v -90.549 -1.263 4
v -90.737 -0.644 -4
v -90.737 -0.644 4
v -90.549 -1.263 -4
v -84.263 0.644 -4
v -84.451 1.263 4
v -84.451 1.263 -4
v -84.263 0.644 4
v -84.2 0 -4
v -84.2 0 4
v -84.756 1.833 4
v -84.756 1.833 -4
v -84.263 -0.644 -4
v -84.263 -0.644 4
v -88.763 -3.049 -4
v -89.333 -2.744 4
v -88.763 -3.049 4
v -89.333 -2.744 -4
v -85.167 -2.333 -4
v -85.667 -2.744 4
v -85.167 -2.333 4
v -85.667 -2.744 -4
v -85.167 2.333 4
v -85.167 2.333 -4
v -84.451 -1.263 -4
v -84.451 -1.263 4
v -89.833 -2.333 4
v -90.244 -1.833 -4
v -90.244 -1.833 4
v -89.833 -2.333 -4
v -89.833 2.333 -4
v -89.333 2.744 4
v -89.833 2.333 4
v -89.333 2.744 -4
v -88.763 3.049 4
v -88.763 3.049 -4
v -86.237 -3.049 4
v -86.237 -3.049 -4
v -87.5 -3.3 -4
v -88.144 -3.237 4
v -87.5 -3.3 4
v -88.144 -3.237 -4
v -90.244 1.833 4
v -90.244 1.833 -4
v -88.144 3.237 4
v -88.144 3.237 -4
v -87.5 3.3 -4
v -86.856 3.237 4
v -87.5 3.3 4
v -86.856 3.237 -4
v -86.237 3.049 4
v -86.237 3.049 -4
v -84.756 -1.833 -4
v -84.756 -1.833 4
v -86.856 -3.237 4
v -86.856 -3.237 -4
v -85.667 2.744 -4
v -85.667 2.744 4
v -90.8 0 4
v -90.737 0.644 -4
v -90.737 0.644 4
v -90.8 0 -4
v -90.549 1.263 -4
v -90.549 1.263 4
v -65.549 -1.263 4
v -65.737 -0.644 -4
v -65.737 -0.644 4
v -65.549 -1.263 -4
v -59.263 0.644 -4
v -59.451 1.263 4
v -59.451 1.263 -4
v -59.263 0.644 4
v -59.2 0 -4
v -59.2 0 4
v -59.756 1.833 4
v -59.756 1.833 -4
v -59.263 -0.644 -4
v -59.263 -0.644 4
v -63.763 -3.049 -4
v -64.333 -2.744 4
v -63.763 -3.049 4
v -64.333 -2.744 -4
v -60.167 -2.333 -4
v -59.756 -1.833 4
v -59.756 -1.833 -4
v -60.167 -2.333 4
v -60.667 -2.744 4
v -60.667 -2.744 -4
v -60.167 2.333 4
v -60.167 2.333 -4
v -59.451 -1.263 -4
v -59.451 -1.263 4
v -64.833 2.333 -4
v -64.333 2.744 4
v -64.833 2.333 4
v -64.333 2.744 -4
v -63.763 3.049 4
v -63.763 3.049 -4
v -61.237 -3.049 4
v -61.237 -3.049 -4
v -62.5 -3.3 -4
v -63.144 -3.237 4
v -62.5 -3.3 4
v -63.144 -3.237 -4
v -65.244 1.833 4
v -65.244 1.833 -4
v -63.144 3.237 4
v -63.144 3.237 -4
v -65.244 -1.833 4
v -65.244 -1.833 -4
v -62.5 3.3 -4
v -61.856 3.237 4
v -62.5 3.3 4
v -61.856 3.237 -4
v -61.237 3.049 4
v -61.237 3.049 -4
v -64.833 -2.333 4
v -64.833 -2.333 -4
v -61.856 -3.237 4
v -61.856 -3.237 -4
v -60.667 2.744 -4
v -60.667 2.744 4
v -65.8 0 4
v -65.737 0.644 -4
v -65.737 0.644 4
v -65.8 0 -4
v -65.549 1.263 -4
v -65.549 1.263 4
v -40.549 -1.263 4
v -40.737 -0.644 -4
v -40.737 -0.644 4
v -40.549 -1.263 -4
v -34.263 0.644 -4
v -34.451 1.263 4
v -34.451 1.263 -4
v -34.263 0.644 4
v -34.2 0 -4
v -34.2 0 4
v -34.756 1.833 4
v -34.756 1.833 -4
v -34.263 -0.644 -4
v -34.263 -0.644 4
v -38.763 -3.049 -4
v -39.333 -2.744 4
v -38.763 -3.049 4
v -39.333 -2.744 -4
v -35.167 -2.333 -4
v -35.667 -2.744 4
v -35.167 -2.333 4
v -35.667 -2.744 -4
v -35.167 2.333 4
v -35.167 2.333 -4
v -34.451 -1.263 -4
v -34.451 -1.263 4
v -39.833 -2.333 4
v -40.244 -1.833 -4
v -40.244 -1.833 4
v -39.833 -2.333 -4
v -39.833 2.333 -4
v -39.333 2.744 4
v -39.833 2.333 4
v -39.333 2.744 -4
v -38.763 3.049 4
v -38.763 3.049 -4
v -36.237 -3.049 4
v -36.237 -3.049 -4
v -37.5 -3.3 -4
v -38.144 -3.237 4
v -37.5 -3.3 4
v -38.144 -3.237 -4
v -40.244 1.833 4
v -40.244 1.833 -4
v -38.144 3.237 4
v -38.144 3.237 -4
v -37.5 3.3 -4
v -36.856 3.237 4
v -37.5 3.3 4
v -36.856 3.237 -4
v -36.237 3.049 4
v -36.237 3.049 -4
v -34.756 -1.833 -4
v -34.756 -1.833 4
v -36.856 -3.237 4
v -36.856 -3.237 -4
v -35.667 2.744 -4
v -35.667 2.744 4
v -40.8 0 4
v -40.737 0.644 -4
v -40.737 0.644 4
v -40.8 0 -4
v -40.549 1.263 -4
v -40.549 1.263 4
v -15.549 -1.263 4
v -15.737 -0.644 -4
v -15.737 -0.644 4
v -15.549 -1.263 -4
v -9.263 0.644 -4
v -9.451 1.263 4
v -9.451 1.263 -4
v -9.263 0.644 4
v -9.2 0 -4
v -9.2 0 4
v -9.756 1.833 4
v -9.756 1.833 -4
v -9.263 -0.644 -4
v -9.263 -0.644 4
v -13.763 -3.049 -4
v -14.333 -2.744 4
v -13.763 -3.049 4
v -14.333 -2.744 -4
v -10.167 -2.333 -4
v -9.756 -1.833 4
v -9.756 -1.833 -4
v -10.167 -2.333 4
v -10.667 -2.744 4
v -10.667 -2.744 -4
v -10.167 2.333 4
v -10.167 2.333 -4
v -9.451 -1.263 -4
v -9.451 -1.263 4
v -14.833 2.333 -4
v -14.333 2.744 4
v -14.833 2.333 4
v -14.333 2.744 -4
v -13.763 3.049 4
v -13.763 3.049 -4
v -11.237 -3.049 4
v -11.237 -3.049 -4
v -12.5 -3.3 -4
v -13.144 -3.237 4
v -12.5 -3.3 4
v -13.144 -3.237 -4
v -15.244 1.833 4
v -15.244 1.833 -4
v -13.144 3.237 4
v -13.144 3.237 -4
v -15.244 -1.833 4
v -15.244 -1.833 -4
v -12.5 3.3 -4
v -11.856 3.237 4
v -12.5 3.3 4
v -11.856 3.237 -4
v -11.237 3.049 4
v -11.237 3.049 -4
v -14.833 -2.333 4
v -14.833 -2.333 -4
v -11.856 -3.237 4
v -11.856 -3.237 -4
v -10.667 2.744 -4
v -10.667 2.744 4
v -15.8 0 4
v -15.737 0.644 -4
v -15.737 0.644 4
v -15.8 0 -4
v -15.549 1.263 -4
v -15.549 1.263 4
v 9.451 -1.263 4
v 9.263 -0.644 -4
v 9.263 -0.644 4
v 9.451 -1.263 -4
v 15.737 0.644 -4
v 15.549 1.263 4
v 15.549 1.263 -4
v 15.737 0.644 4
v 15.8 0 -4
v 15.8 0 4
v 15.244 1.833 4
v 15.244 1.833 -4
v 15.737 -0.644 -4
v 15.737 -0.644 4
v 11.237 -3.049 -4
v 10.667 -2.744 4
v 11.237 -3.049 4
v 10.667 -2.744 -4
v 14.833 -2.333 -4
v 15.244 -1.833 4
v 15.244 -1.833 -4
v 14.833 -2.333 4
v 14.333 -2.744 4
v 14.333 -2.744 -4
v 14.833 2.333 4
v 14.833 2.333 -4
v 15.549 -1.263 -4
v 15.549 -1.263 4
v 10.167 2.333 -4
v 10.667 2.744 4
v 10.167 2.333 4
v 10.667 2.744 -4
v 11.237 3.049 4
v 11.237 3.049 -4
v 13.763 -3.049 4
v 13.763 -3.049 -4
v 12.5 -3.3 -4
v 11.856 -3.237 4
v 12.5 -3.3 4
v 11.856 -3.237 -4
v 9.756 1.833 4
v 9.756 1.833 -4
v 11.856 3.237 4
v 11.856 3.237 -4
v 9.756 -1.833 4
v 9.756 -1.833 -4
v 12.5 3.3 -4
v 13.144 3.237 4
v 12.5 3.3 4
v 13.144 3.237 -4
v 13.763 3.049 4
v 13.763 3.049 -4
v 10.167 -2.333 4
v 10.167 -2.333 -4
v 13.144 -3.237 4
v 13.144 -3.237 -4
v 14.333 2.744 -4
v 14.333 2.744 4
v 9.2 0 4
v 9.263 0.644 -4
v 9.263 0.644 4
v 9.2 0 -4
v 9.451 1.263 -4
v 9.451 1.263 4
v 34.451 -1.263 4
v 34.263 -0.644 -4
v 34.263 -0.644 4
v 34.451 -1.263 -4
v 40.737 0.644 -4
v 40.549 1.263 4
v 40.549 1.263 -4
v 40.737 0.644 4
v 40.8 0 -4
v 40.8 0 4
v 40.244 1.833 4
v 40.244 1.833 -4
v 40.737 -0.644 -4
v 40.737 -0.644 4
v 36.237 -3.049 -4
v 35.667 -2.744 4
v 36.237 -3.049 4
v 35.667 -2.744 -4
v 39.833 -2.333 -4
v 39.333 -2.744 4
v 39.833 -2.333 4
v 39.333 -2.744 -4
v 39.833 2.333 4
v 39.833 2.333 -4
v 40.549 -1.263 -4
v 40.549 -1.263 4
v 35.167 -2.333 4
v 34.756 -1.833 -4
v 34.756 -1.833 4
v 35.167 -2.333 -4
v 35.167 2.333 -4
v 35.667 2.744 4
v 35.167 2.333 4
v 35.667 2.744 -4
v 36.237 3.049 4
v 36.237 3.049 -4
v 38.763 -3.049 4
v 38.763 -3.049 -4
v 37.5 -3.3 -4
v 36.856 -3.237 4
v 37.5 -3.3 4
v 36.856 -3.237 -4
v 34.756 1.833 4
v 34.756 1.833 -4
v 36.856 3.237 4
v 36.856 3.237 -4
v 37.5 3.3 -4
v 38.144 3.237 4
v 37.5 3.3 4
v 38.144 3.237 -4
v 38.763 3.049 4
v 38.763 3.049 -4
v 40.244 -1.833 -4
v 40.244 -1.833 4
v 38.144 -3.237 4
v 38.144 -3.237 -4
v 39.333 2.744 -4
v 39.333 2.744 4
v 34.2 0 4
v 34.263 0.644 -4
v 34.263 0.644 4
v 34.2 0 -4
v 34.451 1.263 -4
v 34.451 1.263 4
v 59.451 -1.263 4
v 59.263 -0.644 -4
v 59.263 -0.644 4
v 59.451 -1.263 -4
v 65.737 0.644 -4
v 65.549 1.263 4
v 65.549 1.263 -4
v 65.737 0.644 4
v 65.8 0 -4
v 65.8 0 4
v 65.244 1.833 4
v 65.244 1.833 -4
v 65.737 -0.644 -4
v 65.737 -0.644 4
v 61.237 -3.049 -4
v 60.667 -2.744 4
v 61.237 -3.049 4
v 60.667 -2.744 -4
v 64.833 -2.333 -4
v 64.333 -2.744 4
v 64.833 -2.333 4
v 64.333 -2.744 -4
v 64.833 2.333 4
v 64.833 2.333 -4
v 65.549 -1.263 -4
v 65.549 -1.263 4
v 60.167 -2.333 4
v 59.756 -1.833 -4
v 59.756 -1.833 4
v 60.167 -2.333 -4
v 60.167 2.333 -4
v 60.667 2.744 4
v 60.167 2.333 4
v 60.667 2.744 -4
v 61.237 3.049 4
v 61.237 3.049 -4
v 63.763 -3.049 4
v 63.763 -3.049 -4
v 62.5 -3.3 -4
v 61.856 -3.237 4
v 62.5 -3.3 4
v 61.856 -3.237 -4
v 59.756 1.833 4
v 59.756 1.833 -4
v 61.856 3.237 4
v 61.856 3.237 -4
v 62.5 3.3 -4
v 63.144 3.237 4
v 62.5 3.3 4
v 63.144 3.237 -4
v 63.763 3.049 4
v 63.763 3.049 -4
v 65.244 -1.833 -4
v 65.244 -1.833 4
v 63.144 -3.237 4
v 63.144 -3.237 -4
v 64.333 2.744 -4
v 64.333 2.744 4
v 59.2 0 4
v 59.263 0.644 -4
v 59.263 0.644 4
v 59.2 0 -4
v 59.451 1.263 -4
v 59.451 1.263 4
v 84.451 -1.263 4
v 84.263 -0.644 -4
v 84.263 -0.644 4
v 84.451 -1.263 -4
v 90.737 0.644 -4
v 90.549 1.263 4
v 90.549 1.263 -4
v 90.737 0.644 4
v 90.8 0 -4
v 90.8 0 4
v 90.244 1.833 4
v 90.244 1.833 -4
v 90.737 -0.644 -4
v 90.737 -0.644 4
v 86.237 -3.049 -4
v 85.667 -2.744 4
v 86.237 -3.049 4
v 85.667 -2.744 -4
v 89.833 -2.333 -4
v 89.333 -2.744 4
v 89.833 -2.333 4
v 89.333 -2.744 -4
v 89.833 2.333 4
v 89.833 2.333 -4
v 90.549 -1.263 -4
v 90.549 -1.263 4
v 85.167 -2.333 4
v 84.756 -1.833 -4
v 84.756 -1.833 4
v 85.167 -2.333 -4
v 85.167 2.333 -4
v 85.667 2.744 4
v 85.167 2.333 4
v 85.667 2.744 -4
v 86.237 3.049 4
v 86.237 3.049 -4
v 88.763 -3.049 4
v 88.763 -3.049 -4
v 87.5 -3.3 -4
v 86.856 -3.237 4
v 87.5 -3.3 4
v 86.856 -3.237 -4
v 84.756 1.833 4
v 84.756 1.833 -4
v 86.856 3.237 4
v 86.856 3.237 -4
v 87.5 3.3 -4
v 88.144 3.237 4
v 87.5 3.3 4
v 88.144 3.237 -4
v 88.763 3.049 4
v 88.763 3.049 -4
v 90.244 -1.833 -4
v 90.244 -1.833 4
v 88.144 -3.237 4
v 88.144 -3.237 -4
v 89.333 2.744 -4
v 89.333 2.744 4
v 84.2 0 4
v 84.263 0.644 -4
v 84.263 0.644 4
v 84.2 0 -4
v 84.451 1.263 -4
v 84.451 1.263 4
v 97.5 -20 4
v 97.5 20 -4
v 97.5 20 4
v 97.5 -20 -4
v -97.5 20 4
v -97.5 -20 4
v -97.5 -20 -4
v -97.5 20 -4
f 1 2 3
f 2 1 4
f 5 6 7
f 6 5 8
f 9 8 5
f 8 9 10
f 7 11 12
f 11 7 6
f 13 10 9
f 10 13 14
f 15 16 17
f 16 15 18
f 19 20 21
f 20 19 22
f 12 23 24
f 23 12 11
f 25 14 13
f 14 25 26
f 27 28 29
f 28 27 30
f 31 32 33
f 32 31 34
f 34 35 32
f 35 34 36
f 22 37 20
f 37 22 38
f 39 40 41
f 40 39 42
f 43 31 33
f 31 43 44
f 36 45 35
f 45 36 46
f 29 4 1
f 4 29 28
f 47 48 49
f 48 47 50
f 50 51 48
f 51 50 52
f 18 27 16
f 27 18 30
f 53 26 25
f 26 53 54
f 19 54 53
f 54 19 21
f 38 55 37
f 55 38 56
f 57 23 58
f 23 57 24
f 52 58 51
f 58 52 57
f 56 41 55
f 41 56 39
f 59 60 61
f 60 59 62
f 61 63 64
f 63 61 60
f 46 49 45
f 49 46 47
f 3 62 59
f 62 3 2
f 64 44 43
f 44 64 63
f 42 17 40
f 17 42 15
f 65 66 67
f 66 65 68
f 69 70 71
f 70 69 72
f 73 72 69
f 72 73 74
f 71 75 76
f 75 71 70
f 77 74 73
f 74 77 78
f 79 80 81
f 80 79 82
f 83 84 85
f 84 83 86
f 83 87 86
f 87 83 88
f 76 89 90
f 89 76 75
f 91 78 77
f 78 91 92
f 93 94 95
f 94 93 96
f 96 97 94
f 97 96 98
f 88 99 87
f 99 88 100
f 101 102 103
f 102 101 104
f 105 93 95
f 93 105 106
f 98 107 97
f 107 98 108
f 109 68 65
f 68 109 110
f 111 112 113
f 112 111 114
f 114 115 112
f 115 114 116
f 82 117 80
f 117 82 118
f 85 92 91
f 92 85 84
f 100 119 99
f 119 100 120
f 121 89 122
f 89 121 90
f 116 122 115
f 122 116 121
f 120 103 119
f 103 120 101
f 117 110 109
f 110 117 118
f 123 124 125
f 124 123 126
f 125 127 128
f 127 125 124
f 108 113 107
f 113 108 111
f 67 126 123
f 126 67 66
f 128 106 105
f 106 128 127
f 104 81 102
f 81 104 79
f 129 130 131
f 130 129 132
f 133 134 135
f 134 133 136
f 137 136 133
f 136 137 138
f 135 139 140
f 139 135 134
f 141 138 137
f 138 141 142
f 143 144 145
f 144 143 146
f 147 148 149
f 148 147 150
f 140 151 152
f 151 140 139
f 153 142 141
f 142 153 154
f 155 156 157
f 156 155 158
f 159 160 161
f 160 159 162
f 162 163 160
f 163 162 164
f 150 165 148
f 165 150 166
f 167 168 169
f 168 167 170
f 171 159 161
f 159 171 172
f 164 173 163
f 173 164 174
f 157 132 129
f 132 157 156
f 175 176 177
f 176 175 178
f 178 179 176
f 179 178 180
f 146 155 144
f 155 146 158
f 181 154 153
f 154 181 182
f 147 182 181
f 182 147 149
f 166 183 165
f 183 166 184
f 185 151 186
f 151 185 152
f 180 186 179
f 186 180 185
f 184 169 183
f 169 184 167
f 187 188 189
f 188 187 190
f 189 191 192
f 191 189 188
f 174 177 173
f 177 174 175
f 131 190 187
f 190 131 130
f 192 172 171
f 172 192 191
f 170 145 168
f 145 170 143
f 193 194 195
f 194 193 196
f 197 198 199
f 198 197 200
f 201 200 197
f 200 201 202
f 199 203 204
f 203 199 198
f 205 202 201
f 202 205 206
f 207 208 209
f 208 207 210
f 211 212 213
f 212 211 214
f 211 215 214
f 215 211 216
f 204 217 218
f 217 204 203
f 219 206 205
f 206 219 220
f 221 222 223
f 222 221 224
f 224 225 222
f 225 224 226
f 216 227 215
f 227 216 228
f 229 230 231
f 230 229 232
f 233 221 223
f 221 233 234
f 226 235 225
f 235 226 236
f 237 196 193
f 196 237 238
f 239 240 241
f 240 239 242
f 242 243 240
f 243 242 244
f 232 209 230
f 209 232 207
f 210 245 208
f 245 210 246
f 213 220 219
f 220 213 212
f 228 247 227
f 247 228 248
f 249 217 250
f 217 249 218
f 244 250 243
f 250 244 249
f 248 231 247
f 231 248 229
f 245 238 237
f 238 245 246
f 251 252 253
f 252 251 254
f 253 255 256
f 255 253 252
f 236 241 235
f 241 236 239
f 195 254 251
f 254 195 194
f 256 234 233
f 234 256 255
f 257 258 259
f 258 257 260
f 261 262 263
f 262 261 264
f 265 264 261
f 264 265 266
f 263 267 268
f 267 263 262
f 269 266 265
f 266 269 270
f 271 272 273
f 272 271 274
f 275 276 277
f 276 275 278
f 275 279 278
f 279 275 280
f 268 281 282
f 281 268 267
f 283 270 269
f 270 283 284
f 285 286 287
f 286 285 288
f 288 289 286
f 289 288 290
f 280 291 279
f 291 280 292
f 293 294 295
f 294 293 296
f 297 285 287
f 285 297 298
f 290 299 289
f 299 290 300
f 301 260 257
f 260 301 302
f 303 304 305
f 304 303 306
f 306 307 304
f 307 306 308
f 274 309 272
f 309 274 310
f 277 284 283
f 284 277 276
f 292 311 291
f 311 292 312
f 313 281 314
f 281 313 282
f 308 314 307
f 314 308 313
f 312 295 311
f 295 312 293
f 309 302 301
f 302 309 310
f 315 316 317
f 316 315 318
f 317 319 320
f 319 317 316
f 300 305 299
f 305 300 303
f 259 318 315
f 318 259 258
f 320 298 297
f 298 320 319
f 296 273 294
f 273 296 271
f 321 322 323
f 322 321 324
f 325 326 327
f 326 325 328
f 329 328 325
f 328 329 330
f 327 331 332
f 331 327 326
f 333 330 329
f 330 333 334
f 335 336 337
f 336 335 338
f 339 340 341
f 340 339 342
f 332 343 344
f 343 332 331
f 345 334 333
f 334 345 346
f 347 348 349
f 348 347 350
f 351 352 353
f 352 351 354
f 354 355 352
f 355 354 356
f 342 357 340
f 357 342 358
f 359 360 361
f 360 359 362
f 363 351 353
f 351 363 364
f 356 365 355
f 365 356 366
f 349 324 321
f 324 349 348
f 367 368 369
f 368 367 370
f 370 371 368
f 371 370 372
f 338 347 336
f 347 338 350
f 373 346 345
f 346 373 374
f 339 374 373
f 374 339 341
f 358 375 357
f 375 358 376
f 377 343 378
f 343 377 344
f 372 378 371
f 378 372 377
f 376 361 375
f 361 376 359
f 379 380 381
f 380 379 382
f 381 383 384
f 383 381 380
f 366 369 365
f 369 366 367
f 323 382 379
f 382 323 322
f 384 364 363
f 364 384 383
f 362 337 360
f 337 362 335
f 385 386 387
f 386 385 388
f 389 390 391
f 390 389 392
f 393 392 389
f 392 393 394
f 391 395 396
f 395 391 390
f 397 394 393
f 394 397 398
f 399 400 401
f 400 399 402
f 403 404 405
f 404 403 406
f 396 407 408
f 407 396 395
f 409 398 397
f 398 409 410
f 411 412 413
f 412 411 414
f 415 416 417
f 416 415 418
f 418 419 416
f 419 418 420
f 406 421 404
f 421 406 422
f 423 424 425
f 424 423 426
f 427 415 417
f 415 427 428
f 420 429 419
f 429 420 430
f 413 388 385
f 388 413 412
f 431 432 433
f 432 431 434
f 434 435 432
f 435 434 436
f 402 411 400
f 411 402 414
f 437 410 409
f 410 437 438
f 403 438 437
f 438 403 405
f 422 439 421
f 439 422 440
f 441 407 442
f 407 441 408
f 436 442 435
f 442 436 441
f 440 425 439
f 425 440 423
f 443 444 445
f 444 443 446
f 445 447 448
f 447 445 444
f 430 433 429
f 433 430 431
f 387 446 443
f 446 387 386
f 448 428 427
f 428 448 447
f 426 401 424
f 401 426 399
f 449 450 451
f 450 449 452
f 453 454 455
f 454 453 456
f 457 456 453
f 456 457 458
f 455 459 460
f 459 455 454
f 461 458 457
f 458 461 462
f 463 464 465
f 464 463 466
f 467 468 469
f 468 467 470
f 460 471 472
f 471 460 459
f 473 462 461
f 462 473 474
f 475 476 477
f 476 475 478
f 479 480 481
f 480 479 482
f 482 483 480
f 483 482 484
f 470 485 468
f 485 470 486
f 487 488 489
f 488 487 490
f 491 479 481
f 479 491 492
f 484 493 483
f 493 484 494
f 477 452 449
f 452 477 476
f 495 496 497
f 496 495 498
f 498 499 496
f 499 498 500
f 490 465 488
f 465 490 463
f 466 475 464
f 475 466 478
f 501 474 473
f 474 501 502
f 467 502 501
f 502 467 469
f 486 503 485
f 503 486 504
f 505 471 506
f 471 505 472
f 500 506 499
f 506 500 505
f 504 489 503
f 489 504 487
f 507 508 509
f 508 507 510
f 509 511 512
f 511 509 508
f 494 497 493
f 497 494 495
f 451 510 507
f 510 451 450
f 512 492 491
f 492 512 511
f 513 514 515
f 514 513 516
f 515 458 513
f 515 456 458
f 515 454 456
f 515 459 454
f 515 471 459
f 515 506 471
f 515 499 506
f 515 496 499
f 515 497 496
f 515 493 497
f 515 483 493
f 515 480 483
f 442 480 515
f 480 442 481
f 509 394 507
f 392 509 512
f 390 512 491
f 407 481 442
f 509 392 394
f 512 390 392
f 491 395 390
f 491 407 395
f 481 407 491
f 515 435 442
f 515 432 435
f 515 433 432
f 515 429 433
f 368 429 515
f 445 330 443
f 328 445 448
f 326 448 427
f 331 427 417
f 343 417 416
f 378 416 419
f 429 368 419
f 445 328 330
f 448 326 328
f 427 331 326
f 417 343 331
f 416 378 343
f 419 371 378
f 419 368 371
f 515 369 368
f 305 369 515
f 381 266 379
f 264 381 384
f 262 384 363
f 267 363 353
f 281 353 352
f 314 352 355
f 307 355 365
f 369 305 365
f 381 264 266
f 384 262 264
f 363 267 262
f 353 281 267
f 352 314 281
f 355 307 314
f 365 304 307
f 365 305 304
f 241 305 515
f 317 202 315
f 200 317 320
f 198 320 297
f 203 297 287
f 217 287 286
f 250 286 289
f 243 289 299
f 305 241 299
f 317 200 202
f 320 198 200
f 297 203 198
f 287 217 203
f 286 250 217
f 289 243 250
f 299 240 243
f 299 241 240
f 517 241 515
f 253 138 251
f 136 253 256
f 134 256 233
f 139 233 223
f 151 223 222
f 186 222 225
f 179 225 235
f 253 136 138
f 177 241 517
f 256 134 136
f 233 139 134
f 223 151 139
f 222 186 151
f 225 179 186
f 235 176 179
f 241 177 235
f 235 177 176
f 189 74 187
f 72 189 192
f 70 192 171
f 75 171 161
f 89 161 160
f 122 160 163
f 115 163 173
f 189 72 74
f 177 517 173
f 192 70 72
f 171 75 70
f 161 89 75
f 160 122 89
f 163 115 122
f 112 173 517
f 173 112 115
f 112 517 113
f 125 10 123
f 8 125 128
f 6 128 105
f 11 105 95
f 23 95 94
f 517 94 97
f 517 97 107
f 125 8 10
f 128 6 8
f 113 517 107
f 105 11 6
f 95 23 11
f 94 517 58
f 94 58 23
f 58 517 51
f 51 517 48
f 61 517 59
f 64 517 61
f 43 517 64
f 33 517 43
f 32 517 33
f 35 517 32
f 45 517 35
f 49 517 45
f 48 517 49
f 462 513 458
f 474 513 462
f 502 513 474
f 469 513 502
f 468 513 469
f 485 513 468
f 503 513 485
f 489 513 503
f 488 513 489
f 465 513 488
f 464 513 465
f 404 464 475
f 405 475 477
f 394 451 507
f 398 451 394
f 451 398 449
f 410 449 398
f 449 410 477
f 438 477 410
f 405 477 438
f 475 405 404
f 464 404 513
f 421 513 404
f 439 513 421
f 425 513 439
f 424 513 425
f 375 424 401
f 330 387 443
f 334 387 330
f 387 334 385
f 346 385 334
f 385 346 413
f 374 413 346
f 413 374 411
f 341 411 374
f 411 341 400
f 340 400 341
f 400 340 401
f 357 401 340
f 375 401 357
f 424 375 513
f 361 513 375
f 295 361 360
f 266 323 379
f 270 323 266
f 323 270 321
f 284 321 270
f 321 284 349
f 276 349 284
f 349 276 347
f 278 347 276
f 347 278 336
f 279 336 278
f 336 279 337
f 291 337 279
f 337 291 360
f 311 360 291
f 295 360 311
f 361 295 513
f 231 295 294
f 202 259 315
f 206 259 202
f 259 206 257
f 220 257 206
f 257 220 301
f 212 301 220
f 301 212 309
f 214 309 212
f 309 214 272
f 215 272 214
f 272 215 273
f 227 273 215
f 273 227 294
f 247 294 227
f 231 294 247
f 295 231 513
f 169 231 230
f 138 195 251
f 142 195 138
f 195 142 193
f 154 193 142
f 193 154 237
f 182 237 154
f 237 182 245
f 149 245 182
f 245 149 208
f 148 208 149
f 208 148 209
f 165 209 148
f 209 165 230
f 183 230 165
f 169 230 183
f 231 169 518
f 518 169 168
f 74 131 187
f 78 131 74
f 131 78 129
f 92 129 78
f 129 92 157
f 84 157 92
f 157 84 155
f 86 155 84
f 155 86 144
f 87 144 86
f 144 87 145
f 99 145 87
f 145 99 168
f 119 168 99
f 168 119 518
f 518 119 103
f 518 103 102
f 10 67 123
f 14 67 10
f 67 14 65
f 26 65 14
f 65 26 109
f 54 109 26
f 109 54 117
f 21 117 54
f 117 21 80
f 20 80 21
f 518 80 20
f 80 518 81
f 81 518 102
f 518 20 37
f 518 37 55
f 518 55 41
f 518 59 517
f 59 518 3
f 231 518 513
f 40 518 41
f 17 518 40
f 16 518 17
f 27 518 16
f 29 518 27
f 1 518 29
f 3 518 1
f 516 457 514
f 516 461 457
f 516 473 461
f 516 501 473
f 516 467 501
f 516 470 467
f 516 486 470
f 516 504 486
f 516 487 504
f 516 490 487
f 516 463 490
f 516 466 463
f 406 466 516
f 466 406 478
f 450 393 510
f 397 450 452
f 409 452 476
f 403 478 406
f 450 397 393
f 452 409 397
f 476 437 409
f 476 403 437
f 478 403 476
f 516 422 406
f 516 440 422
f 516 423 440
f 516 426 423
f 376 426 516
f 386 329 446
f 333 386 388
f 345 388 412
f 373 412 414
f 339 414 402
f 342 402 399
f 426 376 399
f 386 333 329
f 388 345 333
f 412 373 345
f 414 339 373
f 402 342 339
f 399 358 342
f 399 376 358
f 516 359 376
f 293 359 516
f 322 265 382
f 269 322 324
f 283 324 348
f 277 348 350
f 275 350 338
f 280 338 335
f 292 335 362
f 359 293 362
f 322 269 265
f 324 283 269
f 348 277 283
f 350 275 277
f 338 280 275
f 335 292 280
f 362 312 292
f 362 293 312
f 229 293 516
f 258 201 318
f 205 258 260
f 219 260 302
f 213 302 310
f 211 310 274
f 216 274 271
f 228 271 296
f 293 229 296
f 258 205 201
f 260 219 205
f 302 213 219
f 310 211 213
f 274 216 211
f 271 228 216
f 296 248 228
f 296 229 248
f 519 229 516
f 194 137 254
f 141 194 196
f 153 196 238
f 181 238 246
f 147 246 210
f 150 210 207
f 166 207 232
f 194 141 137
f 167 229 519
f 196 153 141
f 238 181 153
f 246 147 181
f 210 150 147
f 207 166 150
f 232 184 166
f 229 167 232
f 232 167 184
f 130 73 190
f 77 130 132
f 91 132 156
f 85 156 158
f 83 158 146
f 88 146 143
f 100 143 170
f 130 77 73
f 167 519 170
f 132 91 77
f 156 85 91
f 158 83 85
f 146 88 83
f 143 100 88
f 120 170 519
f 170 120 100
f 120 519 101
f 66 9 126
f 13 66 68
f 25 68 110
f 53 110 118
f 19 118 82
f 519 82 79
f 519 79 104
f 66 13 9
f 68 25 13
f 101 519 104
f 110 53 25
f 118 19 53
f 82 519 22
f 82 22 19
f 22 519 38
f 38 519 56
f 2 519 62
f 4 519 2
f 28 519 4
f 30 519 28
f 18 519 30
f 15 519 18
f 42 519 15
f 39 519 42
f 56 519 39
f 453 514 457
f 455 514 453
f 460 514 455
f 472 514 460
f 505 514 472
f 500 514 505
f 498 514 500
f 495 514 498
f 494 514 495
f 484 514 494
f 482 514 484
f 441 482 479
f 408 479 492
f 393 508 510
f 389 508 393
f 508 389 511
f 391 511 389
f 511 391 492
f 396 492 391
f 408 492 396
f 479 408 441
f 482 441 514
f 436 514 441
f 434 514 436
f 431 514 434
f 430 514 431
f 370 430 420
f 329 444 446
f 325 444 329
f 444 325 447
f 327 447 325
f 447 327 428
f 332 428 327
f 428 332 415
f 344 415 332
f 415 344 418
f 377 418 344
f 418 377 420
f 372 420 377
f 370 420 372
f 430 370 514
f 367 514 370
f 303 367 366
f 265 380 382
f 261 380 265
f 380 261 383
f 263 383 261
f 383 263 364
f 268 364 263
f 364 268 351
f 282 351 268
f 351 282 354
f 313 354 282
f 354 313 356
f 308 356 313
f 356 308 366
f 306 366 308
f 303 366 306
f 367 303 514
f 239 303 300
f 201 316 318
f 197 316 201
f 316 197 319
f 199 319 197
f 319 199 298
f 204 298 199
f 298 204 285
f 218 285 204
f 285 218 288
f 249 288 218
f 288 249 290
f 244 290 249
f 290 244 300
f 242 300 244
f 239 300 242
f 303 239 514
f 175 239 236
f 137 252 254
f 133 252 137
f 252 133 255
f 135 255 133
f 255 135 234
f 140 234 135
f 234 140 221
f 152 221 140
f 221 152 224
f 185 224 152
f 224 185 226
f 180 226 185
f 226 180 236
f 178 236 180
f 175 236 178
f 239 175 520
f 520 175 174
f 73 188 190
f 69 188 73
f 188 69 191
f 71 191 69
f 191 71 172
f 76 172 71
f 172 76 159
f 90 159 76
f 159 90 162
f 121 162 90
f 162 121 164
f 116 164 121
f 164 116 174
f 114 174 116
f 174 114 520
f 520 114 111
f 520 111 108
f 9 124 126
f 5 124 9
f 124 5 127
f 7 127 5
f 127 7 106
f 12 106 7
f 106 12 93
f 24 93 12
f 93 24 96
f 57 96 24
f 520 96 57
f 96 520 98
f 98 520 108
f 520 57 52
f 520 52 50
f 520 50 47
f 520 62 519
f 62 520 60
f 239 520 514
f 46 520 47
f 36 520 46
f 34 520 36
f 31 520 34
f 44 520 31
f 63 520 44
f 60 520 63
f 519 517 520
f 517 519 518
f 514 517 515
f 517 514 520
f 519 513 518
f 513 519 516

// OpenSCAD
$fn = 32;

// ----------------------------------------------------------------------
// Hole bar, 8 x Ø6.6
// row layout, 10 mm edge offset
// ----------------------------------------------------------------------

// --- parameters (mm) ---
bar_w = 40;    // bar width (Y)
bar_t = 8;     // bar thickness (Z)
holes = 8;     // holes per row
hole_d = 6.6;  // hole diameter
edge = 10;     // offset from the bar end to the first hole
pitch = 25;    // pitch between neighbouring holes

// --- derived feature positions (mm) ---
span = (holes - 1) * pitch;   // = 175   distance between the end holes
bar_l = span + 2 * edge;      // = 195   overall bar length
start_x = -bar_l / 2 + edge;  // = -87.5   X of the first hole
feature_centers = [
  [start_x + 0 * pitch, 0],
  [start_x + 1 * pitch, 0],
  [start_x + 2 * pitch, 0],
  [start_x + 3 * pitch, 0],
  [start_x + 4 * pitch, 0],
  [start_x + 5 * pitch, 0],
  [start_x + 6 * pitch, 0],
  [start_x + 7 * pitch, 0]
];   // hole centres of the first row

// bar with one row of holes, drilled from feature_centers
difference() {
  translate([-bar_l / 2, -bar_w / 2, -bar_t / 2]) cube([bar_l, bar_w, bar_t]);
  for (centre = feature_centers)
    translate([centre[0], centre[1], 0])
      cylinder(d = hole_d, h = bar_t + 2, center = true);
}
